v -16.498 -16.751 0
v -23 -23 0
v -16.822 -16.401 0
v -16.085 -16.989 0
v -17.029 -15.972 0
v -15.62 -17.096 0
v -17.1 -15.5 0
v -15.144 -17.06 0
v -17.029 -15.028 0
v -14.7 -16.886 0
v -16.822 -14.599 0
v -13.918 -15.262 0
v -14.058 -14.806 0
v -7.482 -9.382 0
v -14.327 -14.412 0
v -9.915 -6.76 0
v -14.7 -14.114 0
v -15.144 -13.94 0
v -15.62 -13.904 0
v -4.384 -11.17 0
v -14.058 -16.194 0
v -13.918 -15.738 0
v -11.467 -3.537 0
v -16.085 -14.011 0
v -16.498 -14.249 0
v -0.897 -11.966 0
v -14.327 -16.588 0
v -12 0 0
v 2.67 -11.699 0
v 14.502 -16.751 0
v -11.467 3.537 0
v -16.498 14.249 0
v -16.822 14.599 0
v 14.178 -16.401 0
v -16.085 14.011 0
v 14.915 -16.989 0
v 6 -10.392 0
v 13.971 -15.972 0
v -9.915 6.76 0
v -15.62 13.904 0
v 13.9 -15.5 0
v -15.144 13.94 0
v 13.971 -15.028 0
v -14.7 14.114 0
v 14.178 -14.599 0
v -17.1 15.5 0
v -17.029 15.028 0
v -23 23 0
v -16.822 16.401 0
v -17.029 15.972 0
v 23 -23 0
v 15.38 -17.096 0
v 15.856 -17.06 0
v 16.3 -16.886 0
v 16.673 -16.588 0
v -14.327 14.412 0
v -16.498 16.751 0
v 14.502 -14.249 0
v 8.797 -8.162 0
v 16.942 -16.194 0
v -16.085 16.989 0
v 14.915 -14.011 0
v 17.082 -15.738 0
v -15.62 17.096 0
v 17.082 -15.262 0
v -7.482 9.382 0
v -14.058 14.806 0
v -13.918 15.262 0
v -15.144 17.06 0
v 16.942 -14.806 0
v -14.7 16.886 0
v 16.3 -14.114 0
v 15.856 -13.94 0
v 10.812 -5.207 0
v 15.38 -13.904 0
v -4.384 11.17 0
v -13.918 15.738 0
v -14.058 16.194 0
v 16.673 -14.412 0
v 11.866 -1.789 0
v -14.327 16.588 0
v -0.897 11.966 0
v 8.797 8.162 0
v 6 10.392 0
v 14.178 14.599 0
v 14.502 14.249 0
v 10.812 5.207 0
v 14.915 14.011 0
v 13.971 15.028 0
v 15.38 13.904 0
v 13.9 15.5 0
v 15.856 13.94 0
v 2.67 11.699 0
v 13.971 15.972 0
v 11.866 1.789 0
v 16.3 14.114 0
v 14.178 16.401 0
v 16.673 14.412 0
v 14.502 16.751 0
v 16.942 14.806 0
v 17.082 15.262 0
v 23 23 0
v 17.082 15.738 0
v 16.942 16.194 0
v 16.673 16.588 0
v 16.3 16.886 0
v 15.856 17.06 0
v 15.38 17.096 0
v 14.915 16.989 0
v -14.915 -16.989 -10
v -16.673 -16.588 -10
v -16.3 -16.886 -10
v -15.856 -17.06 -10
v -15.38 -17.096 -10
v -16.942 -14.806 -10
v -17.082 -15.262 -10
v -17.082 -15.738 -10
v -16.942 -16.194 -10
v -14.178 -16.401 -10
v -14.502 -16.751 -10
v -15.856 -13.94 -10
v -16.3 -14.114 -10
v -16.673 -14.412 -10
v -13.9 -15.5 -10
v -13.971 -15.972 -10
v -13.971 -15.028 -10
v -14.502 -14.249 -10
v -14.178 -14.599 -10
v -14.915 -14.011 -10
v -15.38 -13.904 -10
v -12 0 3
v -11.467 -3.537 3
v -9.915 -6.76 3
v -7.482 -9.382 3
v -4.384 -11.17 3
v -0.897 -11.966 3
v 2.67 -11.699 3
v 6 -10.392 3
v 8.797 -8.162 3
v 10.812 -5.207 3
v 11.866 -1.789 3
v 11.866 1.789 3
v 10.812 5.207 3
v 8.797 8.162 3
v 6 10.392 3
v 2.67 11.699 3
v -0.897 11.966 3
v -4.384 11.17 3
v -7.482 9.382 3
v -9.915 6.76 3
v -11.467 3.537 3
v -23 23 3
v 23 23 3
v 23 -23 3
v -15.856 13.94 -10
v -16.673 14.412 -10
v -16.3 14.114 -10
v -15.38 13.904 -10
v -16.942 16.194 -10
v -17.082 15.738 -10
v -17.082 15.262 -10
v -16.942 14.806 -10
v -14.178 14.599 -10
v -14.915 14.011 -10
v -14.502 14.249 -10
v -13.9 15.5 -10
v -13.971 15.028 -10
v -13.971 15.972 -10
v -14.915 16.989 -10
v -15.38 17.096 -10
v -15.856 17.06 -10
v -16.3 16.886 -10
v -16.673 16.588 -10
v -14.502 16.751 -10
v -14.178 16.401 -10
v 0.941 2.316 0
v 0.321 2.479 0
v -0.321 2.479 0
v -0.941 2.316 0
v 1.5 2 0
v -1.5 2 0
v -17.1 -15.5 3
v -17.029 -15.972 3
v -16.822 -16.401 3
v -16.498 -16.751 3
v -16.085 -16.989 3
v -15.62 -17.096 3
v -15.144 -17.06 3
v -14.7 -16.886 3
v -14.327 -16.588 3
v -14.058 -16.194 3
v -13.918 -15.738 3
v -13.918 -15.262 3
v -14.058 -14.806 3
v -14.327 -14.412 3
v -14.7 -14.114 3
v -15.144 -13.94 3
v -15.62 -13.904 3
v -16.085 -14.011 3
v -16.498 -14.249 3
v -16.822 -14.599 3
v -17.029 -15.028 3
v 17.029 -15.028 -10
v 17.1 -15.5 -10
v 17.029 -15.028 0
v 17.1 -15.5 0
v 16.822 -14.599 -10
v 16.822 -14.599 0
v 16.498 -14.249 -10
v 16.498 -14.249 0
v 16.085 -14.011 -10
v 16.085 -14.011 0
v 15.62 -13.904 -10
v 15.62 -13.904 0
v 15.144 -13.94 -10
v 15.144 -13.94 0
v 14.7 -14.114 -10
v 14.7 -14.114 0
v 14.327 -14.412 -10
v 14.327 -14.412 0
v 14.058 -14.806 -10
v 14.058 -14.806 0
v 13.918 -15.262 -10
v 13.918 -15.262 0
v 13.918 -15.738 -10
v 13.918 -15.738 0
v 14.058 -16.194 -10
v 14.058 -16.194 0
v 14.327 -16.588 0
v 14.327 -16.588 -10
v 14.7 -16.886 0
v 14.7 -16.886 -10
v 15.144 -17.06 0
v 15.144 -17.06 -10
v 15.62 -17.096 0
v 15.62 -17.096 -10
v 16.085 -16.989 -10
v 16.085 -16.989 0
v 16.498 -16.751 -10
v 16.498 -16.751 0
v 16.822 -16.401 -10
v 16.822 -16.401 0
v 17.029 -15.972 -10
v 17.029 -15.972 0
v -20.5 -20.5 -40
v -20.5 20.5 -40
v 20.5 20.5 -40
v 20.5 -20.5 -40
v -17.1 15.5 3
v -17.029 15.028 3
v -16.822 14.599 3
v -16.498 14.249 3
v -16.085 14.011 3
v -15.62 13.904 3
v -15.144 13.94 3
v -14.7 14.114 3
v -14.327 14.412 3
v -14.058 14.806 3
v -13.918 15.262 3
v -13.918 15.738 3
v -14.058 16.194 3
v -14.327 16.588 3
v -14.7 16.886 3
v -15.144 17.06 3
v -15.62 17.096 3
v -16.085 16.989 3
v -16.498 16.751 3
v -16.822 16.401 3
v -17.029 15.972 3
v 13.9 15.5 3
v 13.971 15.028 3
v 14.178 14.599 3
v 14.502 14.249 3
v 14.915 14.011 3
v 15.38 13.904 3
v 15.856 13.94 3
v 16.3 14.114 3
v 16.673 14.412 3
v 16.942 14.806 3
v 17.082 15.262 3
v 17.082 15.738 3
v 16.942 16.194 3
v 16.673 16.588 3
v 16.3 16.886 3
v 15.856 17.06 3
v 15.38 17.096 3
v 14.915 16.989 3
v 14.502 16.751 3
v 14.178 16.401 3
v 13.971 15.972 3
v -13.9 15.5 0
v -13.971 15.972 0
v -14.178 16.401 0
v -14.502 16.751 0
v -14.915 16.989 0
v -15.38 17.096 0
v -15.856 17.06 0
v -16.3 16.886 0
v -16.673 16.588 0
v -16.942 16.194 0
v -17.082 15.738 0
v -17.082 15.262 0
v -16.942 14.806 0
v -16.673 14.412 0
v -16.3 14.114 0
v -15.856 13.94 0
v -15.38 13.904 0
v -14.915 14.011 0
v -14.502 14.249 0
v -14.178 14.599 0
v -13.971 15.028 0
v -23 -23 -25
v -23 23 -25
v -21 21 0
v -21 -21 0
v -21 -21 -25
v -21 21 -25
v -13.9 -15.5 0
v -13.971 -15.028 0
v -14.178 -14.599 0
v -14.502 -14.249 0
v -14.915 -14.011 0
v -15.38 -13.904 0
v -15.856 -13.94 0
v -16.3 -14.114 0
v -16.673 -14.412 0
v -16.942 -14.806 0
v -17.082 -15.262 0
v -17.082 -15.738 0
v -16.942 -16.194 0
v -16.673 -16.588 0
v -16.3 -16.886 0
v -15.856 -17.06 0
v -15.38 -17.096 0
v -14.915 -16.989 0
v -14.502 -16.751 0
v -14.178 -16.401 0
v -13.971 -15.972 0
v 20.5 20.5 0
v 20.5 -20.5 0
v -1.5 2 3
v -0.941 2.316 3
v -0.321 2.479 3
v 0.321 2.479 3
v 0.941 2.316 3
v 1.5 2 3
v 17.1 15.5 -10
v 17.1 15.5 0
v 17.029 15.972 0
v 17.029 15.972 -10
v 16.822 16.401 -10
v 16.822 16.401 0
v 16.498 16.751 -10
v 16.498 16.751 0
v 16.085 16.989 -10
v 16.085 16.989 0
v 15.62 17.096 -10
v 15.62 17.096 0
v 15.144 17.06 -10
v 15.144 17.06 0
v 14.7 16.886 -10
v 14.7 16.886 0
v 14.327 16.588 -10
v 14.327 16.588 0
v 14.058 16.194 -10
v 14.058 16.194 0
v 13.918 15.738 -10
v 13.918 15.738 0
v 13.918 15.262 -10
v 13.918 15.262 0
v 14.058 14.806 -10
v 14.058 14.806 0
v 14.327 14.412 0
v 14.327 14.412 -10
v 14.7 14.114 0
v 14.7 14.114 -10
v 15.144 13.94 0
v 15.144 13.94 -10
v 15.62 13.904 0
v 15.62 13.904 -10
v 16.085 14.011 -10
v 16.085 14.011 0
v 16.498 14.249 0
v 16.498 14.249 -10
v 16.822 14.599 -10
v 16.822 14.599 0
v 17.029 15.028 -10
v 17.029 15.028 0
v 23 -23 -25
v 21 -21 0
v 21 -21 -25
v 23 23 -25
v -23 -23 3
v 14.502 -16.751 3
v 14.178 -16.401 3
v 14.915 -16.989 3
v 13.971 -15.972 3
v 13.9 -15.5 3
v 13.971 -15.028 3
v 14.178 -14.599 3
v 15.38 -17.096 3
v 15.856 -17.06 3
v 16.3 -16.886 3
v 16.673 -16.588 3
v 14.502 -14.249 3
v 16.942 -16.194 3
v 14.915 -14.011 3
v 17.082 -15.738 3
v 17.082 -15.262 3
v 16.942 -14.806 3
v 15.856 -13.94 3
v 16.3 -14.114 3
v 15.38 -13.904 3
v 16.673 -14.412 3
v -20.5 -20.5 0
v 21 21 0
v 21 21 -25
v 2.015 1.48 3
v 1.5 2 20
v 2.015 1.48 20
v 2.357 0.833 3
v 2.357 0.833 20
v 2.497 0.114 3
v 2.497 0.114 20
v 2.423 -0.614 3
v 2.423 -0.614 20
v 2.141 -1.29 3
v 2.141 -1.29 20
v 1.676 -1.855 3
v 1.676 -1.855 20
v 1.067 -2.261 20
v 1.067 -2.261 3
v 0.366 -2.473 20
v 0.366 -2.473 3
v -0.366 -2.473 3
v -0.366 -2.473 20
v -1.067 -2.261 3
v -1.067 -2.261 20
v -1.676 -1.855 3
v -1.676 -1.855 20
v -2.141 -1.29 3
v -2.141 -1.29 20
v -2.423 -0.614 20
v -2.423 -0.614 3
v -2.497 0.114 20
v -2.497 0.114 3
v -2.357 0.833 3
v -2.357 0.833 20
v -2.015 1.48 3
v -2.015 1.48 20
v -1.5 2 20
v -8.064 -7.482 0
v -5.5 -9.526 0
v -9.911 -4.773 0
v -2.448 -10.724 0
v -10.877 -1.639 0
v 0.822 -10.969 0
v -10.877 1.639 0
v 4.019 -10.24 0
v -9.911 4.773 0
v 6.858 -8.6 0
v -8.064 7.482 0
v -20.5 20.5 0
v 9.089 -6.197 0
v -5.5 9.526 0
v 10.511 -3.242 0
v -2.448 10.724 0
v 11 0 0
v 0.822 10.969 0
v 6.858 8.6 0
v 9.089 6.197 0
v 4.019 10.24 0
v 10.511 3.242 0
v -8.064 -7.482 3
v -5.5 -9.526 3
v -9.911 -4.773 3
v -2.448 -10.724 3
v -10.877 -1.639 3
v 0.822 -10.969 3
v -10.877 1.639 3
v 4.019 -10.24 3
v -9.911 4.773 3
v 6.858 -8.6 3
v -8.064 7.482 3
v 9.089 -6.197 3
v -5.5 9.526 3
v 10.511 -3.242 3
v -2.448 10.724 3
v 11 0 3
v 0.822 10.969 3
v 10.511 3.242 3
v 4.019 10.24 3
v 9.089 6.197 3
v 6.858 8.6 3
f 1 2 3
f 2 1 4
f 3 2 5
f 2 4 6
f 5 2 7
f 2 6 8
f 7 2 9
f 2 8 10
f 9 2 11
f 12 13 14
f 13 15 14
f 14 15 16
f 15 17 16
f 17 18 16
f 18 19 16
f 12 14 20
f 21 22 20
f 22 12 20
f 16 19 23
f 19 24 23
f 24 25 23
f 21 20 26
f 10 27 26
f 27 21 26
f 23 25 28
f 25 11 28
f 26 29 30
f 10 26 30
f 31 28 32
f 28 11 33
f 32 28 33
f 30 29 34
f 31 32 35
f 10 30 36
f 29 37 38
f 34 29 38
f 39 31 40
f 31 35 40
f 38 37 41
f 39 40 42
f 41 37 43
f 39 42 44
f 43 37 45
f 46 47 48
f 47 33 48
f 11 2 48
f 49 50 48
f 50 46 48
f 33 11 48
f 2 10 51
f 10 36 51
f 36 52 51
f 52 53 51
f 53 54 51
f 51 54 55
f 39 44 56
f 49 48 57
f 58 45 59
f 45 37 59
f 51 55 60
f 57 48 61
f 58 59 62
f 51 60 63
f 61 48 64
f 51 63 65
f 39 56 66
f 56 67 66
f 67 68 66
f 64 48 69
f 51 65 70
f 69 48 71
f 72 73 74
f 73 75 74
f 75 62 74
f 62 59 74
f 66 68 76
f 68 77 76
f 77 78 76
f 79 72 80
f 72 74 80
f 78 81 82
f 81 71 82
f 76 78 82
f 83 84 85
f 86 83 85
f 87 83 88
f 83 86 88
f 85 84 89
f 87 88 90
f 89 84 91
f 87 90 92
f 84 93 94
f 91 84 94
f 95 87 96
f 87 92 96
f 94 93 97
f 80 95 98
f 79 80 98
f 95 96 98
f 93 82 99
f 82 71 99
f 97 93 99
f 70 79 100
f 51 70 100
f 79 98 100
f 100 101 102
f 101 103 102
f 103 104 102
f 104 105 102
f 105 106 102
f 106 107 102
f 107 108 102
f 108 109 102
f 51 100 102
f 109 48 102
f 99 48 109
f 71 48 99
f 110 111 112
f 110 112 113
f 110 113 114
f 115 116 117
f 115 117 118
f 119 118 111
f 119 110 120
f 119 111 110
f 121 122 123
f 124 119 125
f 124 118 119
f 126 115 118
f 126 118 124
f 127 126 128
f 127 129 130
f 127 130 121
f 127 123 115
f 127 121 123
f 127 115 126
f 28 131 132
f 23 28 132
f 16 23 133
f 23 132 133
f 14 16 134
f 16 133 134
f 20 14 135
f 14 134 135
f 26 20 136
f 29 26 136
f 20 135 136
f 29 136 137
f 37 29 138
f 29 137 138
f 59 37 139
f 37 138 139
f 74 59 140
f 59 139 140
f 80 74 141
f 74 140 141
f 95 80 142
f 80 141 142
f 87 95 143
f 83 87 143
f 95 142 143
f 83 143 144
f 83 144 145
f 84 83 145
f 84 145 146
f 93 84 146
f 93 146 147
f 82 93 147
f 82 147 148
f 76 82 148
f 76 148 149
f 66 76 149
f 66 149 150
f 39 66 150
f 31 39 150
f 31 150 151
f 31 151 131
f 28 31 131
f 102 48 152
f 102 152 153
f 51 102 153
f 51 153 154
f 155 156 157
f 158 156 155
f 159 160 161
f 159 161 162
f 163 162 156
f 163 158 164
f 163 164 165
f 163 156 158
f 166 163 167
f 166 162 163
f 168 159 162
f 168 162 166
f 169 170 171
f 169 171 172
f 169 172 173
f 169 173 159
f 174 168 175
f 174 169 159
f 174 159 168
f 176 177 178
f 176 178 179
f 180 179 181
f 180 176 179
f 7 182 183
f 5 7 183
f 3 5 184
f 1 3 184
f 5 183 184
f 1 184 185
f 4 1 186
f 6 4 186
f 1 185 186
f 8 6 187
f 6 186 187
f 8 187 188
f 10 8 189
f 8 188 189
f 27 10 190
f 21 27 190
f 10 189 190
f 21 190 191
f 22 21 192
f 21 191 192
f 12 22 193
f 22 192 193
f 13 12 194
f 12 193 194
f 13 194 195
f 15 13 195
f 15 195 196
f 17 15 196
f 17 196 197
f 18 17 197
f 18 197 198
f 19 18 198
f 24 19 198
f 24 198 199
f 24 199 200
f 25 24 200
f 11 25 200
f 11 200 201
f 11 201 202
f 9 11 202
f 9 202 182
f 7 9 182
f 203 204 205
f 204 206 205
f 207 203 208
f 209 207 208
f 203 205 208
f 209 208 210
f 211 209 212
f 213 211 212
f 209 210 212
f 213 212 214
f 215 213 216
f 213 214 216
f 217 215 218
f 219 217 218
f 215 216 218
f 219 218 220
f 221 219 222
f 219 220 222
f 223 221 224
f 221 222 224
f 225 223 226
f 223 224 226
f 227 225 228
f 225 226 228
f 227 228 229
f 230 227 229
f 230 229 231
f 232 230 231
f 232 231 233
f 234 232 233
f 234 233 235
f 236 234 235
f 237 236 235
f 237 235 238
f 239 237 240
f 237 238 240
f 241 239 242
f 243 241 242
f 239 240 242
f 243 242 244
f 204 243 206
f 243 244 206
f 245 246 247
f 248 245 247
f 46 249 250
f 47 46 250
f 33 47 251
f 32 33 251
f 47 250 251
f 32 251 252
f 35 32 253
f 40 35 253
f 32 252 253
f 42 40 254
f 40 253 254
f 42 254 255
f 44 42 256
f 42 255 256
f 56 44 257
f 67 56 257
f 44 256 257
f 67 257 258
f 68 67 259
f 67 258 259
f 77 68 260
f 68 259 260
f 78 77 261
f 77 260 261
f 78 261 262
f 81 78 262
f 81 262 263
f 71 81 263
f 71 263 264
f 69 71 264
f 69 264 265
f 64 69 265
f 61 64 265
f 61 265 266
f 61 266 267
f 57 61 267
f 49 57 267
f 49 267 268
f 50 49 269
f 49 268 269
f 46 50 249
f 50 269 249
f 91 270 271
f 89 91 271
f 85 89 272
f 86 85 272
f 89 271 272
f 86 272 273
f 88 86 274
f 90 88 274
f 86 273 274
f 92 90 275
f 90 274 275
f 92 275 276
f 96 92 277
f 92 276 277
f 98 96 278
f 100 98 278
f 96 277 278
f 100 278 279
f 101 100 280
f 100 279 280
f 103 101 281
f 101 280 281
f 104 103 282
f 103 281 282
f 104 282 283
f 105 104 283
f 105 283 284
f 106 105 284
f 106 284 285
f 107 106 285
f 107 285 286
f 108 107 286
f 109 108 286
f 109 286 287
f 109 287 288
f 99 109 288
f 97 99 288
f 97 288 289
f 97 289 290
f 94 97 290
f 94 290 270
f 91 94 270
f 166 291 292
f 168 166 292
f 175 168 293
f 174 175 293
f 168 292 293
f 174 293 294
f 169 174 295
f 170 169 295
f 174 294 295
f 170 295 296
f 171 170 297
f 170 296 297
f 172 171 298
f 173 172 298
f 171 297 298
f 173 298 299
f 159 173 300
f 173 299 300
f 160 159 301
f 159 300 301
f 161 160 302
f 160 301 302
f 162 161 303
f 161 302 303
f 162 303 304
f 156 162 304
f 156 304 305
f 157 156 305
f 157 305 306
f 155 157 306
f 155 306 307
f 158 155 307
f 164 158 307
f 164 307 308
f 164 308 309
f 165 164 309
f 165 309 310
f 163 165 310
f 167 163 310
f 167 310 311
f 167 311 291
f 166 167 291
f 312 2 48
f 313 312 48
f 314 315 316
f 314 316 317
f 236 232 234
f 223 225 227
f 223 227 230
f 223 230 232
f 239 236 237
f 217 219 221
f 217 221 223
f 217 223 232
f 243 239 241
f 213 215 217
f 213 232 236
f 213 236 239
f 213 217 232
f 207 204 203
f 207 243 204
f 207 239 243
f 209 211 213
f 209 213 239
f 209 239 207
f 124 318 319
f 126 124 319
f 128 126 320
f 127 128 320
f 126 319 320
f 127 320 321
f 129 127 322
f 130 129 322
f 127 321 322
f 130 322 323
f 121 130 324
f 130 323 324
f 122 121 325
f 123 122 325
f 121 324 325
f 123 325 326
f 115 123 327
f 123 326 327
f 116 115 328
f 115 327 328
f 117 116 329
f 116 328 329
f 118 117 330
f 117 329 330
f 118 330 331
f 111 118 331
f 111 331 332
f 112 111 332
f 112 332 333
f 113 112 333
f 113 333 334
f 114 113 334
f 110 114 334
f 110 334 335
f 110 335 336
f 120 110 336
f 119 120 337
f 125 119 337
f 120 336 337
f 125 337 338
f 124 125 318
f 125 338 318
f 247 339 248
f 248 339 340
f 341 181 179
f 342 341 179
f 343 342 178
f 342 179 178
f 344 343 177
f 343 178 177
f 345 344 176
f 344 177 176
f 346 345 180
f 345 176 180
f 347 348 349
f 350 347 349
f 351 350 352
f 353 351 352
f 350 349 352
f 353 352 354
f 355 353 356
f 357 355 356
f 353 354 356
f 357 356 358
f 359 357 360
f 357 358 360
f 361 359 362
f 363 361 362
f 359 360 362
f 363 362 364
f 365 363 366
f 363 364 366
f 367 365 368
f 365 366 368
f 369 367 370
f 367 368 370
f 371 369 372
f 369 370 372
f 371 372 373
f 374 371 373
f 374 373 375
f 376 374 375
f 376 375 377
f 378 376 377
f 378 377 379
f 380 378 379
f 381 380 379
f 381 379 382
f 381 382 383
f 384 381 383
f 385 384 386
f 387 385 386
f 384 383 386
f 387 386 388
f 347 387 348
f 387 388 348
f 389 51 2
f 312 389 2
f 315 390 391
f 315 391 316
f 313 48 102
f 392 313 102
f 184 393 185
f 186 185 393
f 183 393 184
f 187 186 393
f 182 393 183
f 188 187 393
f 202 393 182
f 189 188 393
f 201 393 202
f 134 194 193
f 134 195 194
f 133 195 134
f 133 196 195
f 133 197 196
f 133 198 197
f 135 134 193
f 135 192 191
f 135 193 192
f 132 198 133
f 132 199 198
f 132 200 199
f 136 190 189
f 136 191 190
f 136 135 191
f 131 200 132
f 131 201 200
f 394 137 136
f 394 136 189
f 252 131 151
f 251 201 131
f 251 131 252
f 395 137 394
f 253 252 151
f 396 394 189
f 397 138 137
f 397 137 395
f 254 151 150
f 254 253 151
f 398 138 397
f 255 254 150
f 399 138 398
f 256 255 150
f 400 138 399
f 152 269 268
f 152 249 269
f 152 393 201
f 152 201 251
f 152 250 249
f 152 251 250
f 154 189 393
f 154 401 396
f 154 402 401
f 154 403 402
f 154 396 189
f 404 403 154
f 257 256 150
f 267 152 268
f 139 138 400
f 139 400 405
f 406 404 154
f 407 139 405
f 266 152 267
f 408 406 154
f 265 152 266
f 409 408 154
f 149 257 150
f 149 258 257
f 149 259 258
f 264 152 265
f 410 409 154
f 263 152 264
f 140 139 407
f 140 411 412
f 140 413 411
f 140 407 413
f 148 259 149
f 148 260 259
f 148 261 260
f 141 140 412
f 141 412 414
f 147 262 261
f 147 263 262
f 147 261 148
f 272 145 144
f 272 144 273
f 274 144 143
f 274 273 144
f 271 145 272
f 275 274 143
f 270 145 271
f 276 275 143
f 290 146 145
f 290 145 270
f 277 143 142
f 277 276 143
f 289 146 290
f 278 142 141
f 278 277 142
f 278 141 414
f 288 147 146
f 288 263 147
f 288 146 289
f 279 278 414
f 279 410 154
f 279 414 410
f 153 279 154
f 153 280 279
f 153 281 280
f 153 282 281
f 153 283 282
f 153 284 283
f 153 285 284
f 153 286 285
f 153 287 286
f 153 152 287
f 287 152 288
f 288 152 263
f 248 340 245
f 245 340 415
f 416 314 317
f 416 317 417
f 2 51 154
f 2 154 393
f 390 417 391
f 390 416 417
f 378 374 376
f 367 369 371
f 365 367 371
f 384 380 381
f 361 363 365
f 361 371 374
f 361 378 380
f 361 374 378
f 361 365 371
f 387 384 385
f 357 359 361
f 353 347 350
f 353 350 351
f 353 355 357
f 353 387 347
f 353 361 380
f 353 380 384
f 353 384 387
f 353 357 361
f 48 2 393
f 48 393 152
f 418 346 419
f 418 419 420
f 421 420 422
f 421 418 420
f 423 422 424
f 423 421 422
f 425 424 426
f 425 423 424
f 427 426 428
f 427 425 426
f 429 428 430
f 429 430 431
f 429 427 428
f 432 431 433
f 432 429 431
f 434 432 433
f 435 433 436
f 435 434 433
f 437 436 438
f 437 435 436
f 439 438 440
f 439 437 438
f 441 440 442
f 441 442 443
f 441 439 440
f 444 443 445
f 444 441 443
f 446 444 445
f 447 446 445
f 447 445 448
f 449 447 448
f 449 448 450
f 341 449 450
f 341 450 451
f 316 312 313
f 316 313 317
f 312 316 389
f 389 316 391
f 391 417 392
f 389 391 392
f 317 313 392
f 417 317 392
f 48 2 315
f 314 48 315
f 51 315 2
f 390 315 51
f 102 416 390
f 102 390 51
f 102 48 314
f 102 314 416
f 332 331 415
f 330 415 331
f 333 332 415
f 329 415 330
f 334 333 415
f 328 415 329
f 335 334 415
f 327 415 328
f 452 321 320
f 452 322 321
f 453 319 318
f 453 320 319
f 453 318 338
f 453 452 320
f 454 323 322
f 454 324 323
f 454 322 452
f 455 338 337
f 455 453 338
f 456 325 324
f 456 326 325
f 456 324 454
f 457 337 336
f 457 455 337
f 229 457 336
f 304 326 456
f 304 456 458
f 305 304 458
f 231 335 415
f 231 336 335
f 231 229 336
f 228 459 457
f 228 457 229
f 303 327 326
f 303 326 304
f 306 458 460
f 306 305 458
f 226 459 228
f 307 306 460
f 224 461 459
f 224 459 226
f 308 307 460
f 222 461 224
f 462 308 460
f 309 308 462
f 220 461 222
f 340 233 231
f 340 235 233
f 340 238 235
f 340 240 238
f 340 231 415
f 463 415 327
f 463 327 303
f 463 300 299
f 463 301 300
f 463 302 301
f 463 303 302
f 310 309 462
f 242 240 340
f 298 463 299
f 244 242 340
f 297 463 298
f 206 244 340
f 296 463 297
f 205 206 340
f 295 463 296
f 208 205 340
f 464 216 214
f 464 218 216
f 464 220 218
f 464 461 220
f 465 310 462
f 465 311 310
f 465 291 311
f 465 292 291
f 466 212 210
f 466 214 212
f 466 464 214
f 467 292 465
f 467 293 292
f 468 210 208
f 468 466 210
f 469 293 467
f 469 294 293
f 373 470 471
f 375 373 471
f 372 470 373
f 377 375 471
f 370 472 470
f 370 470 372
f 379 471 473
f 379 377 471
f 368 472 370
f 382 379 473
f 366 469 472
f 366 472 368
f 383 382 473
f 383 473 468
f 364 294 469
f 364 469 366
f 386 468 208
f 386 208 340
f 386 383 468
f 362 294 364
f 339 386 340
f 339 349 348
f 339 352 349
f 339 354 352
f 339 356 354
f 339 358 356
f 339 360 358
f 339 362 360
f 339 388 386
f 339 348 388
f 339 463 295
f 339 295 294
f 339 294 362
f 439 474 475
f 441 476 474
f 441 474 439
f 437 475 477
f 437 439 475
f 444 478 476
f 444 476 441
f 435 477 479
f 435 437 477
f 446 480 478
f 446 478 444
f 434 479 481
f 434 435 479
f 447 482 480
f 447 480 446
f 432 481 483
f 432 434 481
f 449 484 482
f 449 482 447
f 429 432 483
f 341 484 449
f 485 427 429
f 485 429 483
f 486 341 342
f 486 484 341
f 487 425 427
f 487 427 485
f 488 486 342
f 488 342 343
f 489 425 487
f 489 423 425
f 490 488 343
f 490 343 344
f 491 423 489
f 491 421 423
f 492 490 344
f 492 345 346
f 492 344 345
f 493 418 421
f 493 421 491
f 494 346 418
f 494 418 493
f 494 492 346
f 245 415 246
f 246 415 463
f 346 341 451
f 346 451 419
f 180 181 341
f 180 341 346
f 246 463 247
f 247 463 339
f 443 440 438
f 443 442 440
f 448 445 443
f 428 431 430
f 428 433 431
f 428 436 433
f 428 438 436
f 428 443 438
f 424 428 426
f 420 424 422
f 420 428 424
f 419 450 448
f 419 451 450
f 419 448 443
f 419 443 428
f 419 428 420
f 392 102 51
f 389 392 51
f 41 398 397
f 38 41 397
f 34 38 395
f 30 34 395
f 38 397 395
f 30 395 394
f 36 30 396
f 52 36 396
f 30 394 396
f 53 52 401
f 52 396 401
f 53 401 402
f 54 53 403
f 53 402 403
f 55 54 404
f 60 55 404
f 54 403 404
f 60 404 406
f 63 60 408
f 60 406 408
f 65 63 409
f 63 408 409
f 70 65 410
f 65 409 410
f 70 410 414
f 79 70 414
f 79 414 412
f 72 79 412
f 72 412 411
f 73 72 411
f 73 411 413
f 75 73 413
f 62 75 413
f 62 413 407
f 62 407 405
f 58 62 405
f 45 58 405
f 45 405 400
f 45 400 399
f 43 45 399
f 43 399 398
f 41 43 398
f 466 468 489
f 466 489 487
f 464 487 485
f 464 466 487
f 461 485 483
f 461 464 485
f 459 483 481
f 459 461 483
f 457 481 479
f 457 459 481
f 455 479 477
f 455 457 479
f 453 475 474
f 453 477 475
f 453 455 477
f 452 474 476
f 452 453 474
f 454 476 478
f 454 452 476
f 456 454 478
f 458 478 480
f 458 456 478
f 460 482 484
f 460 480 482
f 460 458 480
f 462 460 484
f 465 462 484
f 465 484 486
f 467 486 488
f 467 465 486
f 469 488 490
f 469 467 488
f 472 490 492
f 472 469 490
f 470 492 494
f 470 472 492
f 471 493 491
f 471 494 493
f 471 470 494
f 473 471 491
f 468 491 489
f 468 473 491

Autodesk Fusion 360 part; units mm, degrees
sketch "Sketch1" plane through (0, 0, 0) normal (0, 0, 1) x (1, 0, 0) in component "Nema-17"
  line L0 (20.5, -20.5) -> (-20.5, -20.5)
  line L1 (-20.5, -20.5) -> (-20.5, 20.5)
  line L2 (-20.5, 20.5) -> (20.5, 20.5)
  line L3 (20.5, 20.5) -> (20.5, -20.5)
  line L4 (20.5, -20.5) -> (-20.5, 20.5) construction
  line L5 (-20.5, -20.5) -> (20.5, 20.5) construction
  circle A0 centre (15.5, -15.5) radius 1.6
  circle A1 centre (15.5, 15.5) radius 1.6
  circle A2 centre (-15.5, 15.5) radius 1.6
  circle A3 centre (-15.5, -15.5) radius 1.6
  circle A4 centre (0, 0) radius 11
  circle A5 centre (0, 0) radius 2.5
  circle A6 centre (0, 0) radius 2
  line L6 (0, 2) -> (1.5, 2)
  line L7 (-1.5, 2) -> (1.5, 2)
  dimension "d1" = 41
  dimension "d2" = 41
  dimension "d7" = 3.2
  dimension "d8" = 5
  dimension "d9" = 5
  dimension "d10" = 3.2
  dimension "d11" = 5
  dimension "d12" = 5
  dimension "d13" = 3.2
  dimension "d14" = 5
  dimension "d15" = 5
  dimension "d16" = 3.2
  dimension "d17" = 5
  dimension "d18" = 5
  dimension "d19" = 22
  dimension "d20" = 5
  dimension "d21" = 4
extrude "Extrude3" add sketch "Sketch1" along normal blind 3 contours A4 makes body 1 in component "Nema-17"
extrude "Extrude2" add sketch "Sketch1" against normal blind 40 separate body contours L0 L1 L2 L3 | A0 | A1 | A2 | A3 | A4 | A6 | A5 L6 L7 | A5 L6 L7 makes body 2 in component "Nema-17"
extrude "Extrude4" cut sketch "Sketch1" against normal blind 10 contours A0 | A1 | A2 | A3 bodies 2 in component "Nema-17"
extrude "Extrude5" add sketch "Sketch1" along normal blind 20 contours A6 | A5 L6 L7 picked at (-1.539, 1.7479) bodies 1 2 in component "Nema-17"
sketch "Sketch1 (2)" plane through (0, 0, 0) normal (0, 0, 1) x (1, 0, 0) in component "joint_cover"
  line L0 (21, -21) -> (-21, -21)
  line L1 (-21, -21) -> (-21, 21)
  line L2 (-21, 21) -> (21, 21)
  line L3 (21, 21) -> (21, -21)
  line L4 (21, -21) -> (-21, 21) construction
  line L5 (-21, -21) -> (21, 21) construction
  line L6 (23, -23) -> (-23, -23)
  line L7 (-23, -23) -> (-23, 23)
  line L8 (-23, 23) -> (23, 23)
  line L9 (23, 23) -> (23, -23)
  line L10 (23, -23) -> (-23, 23) construction
  line L11 (-23, -23) -> (23, 23) construction
  circle A0 centre (0, 0) radius 12
  dimension "d28" = 42
  dimension "d29" = 42
  dimension "d30" = 46
  dimension "d31" = 46
  dimension "d36" = 24
extrude "Extrude2'" add sketch "Sketch1 (2)" along normal blind 3 separate body contours L0 L1 L2 L3 | L6 L7 L8 L9 | A0 makes body 3 in component "joint_cover"
extrude "Extrude1" add sketch "Sketch1 (2)" against normal blind 25 separate body contours L6 L7 L8 L9 makes body 4 in component "joint_cover"
sketch "Sketch2" plane through (0, 0, 3) normal (0, 0, 1) x (-1, 0, 0) in component "joint_cover"
  line L0 (-23, -23) -> (23, -23)
  line L1 (23, -23) -> (23, 23)
  line L2 (23, 23) -> (-23, 23)
  line L3 (-23, 23) -> (-23, -23)
  circle A0 centre (0, 0) radius 12
  circle A1 centre (-15.5, 15.5) radius 1.6
  line L4 (-21, -21) -> (-21, 21)
  line L5 (-21, 21) -> (21, 21)
  circle A2 centre (-15.5, -15.5) radius 1.6
  line L6 (21, -21) -> (-21, -21)
  circle A3 centre (15.5, -15.5) radius 1.6
  line L7 (21, 21) -> (21, -21)
  circle A4 centre (15.5, 15.5) radius 1.6
  dimension "d37" = 24
  dimension "d40" = 3.2
  dimension "d41" = 5.5
  dimension "d42" = 5.5
  dimension "d43" = 3.2
  dimension "d44" = 5.5
  dimension "d45" = 5.5
  dimension "d46" = 3.2
  dimension "d47" = 5.5
  dimension "d48" = 5.5
  dimension "d49" = 3.2
  dimension "d50" = 5.5
  dimension "d51" = 5.5
extrude "Extrude3'" cut sketch "Sketch2" against normal up to surface (3 mm away) contours A0 bodies 3 in component "joint_cover"
extrude "Extrude4'" cut sketch "Sketch2" against normal up to surface (3 mm away) contours A1 | A2 | A3 | A4 bodies 3 in component "joint_cover"
component "Nema-17" placed x (1, 0, 0) y (0, 1, 0) z (0, 0, 1) at (0, 0, 0)
component "joint_cover" placed x (1, 0, 0) y (0, 1, 0) z (0, 0, 1) at (0, 0, 0)
